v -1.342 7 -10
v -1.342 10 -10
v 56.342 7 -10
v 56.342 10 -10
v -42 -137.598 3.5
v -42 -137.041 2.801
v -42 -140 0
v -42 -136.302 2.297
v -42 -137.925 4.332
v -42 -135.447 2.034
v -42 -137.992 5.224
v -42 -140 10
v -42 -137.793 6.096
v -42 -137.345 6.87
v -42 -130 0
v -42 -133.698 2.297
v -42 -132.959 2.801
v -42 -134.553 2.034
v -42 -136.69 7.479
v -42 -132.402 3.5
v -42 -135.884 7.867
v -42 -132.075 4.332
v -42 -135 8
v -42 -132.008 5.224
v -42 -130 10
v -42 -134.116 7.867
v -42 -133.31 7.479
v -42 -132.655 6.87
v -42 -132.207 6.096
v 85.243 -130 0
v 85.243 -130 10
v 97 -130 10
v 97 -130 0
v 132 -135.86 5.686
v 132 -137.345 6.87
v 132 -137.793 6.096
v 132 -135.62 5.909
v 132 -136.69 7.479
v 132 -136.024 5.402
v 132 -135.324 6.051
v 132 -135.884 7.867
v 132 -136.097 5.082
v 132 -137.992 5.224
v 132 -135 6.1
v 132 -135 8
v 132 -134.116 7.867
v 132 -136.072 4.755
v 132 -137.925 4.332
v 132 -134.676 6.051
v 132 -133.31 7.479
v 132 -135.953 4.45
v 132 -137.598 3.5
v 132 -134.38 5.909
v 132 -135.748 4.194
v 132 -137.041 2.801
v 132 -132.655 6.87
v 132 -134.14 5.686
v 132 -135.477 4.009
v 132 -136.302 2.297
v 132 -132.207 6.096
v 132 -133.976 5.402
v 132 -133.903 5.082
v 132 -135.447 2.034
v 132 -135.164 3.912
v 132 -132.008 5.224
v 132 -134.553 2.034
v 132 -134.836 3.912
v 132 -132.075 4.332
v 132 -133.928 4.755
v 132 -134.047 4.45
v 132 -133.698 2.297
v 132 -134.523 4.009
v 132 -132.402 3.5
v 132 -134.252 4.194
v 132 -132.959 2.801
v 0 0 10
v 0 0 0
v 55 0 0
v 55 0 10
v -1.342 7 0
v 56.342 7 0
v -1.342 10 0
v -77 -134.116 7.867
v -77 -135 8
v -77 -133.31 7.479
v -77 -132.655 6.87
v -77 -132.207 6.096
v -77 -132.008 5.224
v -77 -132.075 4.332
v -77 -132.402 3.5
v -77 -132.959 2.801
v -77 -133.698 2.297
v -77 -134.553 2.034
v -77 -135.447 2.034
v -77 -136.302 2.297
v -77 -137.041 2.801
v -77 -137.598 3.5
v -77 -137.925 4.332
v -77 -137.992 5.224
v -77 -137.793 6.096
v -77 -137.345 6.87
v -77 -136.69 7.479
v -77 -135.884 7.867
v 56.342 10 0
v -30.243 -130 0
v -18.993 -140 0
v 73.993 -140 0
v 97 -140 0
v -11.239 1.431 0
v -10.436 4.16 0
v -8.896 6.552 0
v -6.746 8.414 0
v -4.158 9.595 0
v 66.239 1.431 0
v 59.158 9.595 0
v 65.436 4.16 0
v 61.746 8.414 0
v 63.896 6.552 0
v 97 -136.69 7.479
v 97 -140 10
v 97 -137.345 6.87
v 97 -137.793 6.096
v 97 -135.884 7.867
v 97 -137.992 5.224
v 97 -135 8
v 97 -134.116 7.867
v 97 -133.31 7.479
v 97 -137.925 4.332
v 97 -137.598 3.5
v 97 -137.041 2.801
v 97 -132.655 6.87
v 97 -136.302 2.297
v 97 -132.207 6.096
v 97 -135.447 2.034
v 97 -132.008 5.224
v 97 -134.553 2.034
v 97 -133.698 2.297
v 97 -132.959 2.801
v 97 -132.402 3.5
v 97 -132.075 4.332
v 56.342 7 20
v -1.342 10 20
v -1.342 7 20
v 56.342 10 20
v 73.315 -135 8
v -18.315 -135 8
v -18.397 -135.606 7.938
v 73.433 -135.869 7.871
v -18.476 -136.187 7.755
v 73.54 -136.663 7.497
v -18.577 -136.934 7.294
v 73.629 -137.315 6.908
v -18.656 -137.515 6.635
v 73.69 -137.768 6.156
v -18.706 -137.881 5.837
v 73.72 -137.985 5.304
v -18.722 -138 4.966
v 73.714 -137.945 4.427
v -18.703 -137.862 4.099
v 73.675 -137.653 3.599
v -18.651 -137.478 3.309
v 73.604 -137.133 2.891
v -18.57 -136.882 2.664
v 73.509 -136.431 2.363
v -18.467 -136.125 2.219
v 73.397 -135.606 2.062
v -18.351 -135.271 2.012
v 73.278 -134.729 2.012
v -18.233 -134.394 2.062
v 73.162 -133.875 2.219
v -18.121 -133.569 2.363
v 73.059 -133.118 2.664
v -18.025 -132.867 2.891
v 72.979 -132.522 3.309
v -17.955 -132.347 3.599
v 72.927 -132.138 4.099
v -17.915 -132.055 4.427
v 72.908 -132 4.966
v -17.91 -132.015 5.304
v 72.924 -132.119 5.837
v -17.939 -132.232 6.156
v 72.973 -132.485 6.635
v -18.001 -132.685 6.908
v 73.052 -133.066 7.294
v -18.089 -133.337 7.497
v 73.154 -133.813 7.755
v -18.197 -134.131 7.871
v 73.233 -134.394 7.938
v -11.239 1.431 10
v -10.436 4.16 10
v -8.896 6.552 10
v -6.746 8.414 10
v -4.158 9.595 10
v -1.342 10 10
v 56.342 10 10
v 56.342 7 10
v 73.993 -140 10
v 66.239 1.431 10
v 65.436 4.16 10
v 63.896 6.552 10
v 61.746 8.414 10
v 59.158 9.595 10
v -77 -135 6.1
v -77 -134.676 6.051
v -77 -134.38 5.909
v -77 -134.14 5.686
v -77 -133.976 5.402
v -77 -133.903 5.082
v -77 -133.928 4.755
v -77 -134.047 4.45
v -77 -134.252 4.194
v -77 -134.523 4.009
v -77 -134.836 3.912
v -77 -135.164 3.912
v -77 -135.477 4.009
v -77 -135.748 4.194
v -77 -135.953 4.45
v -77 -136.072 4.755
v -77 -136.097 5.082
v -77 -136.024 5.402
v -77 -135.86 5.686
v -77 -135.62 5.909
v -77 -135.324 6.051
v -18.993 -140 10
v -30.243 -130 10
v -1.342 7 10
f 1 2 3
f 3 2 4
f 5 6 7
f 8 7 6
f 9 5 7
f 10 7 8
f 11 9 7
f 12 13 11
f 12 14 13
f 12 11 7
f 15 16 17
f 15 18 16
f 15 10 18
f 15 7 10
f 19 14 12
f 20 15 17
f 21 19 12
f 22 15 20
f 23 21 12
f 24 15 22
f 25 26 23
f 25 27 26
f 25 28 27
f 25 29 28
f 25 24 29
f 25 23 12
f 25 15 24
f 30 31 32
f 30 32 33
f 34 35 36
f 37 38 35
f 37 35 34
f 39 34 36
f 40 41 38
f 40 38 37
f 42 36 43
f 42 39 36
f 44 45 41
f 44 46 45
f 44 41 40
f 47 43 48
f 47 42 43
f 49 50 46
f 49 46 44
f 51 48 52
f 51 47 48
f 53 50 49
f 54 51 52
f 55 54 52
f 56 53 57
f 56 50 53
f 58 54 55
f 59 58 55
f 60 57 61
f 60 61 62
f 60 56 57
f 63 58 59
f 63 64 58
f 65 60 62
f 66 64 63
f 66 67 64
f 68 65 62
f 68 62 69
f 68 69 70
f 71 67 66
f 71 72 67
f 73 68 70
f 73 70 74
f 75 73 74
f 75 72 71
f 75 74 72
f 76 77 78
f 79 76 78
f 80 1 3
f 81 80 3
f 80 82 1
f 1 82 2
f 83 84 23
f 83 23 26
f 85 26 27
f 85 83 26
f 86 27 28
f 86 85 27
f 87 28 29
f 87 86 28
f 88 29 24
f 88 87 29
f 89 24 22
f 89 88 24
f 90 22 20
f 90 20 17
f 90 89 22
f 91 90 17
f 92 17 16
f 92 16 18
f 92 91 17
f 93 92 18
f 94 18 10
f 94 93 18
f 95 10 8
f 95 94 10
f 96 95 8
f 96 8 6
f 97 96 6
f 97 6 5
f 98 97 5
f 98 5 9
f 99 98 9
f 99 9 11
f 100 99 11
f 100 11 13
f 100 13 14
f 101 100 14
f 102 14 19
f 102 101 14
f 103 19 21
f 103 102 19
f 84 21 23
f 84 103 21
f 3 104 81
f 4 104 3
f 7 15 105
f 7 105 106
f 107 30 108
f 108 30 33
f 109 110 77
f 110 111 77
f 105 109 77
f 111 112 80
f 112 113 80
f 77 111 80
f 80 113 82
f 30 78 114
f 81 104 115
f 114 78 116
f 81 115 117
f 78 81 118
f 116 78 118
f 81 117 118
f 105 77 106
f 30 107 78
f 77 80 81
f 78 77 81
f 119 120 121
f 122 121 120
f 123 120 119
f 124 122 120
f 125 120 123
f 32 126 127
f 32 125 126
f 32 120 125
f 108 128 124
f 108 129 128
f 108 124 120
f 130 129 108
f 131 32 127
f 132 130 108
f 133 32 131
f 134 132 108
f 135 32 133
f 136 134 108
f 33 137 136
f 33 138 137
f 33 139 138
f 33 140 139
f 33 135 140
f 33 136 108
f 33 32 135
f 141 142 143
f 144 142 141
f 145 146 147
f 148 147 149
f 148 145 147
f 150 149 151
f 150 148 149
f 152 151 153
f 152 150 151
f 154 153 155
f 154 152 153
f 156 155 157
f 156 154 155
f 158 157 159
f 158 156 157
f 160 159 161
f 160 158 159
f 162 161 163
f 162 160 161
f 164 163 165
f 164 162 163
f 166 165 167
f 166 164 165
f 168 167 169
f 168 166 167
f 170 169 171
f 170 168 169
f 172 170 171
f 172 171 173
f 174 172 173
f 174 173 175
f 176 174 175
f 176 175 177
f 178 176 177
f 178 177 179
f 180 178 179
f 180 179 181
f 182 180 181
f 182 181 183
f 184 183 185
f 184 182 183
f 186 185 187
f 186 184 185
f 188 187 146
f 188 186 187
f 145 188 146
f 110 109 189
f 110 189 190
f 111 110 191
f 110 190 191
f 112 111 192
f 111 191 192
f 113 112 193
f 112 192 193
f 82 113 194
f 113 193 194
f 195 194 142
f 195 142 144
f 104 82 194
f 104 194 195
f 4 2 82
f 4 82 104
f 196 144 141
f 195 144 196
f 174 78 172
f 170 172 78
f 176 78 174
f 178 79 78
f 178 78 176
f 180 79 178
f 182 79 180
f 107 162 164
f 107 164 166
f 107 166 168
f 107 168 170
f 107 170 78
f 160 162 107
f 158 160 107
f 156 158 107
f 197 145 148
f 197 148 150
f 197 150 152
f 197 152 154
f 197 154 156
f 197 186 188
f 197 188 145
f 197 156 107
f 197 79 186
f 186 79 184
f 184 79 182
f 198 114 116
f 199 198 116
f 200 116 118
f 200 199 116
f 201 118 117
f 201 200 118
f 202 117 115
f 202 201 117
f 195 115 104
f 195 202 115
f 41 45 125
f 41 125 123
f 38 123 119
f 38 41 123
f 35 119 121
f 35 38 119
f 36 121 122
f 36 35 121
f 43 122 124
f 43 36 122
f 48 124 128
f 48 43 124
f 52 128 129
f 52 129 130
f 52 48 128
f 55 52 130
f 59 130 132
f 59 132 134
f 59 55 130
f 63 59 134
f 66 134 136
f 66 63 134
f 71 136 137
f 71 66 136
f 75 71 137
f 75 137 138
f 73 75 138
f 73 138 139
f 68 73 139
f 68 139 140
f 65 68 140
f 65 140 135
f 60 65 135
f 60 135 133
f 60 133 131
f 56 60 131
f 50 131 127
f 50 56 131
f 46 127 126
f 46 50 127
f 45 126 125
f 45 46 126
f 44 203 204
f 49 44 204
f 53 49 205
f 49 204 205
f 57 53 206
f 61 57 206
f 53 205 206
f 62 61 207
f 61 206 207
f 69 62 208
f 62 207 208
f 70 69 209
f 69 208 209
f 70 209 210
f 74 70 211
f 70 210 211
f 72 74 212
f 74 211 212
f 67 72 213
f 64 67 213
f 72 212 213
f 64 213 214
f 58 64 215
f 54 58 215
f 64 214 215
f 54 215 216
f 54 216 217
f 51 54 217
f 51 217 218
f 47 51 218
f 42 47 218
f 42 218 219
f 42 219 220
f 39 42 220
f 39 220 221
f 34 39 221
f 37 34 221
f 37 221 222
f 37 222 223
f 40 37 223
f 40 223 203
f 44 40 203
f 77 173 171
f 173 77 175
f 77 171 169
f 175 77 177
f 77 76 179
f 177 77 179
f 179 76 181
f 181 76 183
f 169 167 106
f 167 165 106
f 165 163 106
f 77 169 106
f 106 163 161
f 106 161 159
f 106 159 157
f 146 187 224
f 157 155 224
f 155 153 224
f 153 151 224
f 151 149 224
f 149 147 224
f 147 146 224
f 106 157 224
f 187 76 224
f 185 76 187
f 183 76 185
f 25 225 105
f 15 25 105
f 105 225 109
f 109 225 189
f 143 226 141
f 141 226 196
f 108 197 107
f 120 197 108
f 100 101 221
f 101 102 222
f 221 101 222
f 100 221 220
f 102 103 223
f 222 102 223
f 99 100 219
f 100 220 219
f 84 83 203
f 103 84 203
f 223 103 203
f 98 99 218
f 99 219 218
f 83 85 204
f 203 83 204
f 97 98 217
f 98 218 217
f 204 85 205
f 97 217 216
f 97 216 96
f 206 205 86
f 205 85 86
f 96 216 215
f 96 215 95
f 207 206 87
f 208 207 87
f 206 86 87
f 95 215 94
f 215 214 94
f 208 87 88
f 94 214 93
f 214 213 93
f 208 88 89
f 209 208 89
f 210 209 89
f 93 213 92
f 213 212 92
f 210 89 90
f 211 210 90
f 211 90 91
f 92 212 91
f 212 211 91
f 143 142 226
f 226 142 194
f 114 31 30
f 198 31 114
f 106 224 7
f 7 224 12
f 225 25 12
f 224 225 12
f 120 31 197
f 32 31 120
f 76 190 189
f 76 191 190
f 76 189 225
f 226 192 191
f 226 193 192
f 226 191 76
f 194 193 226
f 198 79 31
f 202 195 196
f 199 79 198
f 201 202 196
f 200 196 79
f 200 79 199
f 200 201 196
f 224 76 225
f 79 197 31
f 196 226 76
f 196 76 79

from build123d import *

# Parameters (mm, degrees)
SKETCH1_W           = 55
SKETCH1_H           = 10
BOSS_EXTRUDE1_DEPTH = 10
BOSS_EXTRUDE2_DEPTH = 10
SKETCH6_W           = 10
SKETCH6_H           = 10
BOSS_EXTRUDE3_DEPTH = 52
SKETCH7_W           = 57.683812306
SKETCH7_H           = 30
BOSS_EXTRUDE4_DEPTH = 3
SKETCH9_OUTSIDE_W   = 83.8
SKETCH9_OUTSIDE_H   = 203.8
SKETCH9_OUTSIDE_R   = 3
CUT_EXTRUDE1_DEPTH  = 35
SKETCH10_OUTSIDE_W  = 83.8
SKETCH10_OUTSIDE_H  = 203.8
SKETCH10_OUTSIDE_R  = 3
CUT_EXTRUDE2_DEPTH  = 35
BOSS_EXTRUDE6_REACH = 254.351
SKETCH14_R          = 3
SKETCH15_R          = 1.1
CUT_EXTRUDE3_DEPTH  = 230


with BuildPart() as part:
    # Sketch1 → Boss-Extrude1 (new body)
    with BuildSketch(Plane.XY):
        with Locations((27.5, 5)):
            Rectangle(SKETCH1_W, SKETCH1_H)
    extrude(amount=BOSS_EXTRUDE1_DEPTH)

    # Sketch3 → Boss-Extrude2 (add)
    with BuildSketch(Plane.XY.offset(10)):
        with BuildLine():
            Line((0, 0), (-18.993043386, -140))
            Line((-18.993043386, -140), (-31.688443832, -140))
            Line((-31.688443832, -140), (-11.238986316, 1.431015115))
            ThreePointArc((-11.238986316, 1.431015115), (-7.887509596, 7.56009759), (-1.341906153, 10))
            Line((-1.341906153, 10), (0, 10))
            Line((0, 10), (0, 0))
        make_face()
    boss_extrude2 = extrude(amount=-BOSS_EXTRUDE2_DEPTH)

    # Mirror1: Boss-Extrude2 across plane
    add(boss_extrude2.mirror(Plane(origin=(27.5, 0, 0), x_dir=(0, 0, 1), z_dir=(1, 0, 0))))

    # Sketch6 → Boss-Extrude3 (add)
    with BuildSketch(Plane(origin=(80, 0, 0), x_dir=(0, 0, -1), z_dir=(1, 0, 0))):
        with Locations((-5, -135)):
            Rectangle(SKETCH6_W, SKETCH6_H)
    boss_extrude3 = extrude(amount=BOSS_EXTRUDE3_DEPTH)

    # Mirror2: Boss-Extrude3 across plane
    add(boss_extrude3.mirror(Plane(origin=(27.5, 0, 0), x_dir=(0, 0, 1), z_dir=(1, 0, 0))))

    # Sketch7 → Boss-Extrude4 (add)
    with BuildSketch(Plane(origin=(0, 10, 0), x_dir=(1, 0, 0), z_dir=(0, 1, 0))):
        with Locations((27.5, -5)):
            Rectangle(SKETCH7_W, SKETCH7_H)
    extrude(amount=-BOSS_EXTRUDE4_DEPTH)

    # Sketch9 outside → Cut-Extrude1 (cut)
    with BuildSketch(Plane.ZY.offset(77)):
        with Locations((5, -65)):
            Rectangle(SKETCH9_OUTSIDE_W, SKETCH9_OUTSIDE_H)
        with Locations((5, -135)):
            Circle(SKETCH9_OUTSIDE_R, mode=Mode.SUBTRACT)
    extrude(amount=-CUT_EXTRUDE1_DEPTH, mode=Mode.SUBTRACT)

    # Sketch10 outside → Cut-Extrude2 (cut)
    with BuildSketch(Plane(origin=(132, 0, 0), x_dir=(0, 0, -1), z_dir=(1, 0, 0))):
        with Locations((-5, -65)):
            Rectangle(SKETCH10_OUTSIDE_W, SKETCH10_OUTSIDE_H)
        with Locations(Location((-5, -135, 0), (0, 0, 180))):
            Circle(SKETCH10_OUTSIDE_R, mode=Mode.SUBTRACT)
    extrude(amount=-CUT_EXTRUDE2_DEPTH, mode=Mode.SUBTRACT)

    # Boss-Extrude6: up to this plane
    boss_extrude6_end = Plane(origin=(0, 0, 0), z_dir=(-0.9909226687301317, 0.13443312313843575, 0))
    # Sketch14 → Boss-Extrude6 (add, up to the surface)
    with BuildSketch(Plane(origin=(132, 0, 0), x_dir=(0, 0, -1), z_dir=(1, 0, 0)), mode=Mode.PRIVATE) as boss_extrude6_sk1:
        with Locations(Location((-5, -135, 0), (0, 0, 180))):
            Circle(SKETCH14_R)
    boss_extrude6_tool1 = split(extrude(boss_extrude6_sk1.sketch, amount=-BOSS_EXTRUDE6_REACH, mode=Mode.PRIVATE), bisect_by=boss_extrude6_end, keep=Keep.BOTH, mode=Mode.PRIVATE)
    add(boss_extrude6_tool1.solids().sort_by_distance((132, -135, 5))[0])

    # Sketch15 → Cut-Extrude3 (cut)
    with BuildSketch(Plane.ZY.offset(77)):
        with Locations((5, -135)):
            Circle(SKETCH15_R)
    extrude(amount=-CUT_EXTRUDE3_DEPTH, mode=Mode.SUBTRACT)


solid = part.part
